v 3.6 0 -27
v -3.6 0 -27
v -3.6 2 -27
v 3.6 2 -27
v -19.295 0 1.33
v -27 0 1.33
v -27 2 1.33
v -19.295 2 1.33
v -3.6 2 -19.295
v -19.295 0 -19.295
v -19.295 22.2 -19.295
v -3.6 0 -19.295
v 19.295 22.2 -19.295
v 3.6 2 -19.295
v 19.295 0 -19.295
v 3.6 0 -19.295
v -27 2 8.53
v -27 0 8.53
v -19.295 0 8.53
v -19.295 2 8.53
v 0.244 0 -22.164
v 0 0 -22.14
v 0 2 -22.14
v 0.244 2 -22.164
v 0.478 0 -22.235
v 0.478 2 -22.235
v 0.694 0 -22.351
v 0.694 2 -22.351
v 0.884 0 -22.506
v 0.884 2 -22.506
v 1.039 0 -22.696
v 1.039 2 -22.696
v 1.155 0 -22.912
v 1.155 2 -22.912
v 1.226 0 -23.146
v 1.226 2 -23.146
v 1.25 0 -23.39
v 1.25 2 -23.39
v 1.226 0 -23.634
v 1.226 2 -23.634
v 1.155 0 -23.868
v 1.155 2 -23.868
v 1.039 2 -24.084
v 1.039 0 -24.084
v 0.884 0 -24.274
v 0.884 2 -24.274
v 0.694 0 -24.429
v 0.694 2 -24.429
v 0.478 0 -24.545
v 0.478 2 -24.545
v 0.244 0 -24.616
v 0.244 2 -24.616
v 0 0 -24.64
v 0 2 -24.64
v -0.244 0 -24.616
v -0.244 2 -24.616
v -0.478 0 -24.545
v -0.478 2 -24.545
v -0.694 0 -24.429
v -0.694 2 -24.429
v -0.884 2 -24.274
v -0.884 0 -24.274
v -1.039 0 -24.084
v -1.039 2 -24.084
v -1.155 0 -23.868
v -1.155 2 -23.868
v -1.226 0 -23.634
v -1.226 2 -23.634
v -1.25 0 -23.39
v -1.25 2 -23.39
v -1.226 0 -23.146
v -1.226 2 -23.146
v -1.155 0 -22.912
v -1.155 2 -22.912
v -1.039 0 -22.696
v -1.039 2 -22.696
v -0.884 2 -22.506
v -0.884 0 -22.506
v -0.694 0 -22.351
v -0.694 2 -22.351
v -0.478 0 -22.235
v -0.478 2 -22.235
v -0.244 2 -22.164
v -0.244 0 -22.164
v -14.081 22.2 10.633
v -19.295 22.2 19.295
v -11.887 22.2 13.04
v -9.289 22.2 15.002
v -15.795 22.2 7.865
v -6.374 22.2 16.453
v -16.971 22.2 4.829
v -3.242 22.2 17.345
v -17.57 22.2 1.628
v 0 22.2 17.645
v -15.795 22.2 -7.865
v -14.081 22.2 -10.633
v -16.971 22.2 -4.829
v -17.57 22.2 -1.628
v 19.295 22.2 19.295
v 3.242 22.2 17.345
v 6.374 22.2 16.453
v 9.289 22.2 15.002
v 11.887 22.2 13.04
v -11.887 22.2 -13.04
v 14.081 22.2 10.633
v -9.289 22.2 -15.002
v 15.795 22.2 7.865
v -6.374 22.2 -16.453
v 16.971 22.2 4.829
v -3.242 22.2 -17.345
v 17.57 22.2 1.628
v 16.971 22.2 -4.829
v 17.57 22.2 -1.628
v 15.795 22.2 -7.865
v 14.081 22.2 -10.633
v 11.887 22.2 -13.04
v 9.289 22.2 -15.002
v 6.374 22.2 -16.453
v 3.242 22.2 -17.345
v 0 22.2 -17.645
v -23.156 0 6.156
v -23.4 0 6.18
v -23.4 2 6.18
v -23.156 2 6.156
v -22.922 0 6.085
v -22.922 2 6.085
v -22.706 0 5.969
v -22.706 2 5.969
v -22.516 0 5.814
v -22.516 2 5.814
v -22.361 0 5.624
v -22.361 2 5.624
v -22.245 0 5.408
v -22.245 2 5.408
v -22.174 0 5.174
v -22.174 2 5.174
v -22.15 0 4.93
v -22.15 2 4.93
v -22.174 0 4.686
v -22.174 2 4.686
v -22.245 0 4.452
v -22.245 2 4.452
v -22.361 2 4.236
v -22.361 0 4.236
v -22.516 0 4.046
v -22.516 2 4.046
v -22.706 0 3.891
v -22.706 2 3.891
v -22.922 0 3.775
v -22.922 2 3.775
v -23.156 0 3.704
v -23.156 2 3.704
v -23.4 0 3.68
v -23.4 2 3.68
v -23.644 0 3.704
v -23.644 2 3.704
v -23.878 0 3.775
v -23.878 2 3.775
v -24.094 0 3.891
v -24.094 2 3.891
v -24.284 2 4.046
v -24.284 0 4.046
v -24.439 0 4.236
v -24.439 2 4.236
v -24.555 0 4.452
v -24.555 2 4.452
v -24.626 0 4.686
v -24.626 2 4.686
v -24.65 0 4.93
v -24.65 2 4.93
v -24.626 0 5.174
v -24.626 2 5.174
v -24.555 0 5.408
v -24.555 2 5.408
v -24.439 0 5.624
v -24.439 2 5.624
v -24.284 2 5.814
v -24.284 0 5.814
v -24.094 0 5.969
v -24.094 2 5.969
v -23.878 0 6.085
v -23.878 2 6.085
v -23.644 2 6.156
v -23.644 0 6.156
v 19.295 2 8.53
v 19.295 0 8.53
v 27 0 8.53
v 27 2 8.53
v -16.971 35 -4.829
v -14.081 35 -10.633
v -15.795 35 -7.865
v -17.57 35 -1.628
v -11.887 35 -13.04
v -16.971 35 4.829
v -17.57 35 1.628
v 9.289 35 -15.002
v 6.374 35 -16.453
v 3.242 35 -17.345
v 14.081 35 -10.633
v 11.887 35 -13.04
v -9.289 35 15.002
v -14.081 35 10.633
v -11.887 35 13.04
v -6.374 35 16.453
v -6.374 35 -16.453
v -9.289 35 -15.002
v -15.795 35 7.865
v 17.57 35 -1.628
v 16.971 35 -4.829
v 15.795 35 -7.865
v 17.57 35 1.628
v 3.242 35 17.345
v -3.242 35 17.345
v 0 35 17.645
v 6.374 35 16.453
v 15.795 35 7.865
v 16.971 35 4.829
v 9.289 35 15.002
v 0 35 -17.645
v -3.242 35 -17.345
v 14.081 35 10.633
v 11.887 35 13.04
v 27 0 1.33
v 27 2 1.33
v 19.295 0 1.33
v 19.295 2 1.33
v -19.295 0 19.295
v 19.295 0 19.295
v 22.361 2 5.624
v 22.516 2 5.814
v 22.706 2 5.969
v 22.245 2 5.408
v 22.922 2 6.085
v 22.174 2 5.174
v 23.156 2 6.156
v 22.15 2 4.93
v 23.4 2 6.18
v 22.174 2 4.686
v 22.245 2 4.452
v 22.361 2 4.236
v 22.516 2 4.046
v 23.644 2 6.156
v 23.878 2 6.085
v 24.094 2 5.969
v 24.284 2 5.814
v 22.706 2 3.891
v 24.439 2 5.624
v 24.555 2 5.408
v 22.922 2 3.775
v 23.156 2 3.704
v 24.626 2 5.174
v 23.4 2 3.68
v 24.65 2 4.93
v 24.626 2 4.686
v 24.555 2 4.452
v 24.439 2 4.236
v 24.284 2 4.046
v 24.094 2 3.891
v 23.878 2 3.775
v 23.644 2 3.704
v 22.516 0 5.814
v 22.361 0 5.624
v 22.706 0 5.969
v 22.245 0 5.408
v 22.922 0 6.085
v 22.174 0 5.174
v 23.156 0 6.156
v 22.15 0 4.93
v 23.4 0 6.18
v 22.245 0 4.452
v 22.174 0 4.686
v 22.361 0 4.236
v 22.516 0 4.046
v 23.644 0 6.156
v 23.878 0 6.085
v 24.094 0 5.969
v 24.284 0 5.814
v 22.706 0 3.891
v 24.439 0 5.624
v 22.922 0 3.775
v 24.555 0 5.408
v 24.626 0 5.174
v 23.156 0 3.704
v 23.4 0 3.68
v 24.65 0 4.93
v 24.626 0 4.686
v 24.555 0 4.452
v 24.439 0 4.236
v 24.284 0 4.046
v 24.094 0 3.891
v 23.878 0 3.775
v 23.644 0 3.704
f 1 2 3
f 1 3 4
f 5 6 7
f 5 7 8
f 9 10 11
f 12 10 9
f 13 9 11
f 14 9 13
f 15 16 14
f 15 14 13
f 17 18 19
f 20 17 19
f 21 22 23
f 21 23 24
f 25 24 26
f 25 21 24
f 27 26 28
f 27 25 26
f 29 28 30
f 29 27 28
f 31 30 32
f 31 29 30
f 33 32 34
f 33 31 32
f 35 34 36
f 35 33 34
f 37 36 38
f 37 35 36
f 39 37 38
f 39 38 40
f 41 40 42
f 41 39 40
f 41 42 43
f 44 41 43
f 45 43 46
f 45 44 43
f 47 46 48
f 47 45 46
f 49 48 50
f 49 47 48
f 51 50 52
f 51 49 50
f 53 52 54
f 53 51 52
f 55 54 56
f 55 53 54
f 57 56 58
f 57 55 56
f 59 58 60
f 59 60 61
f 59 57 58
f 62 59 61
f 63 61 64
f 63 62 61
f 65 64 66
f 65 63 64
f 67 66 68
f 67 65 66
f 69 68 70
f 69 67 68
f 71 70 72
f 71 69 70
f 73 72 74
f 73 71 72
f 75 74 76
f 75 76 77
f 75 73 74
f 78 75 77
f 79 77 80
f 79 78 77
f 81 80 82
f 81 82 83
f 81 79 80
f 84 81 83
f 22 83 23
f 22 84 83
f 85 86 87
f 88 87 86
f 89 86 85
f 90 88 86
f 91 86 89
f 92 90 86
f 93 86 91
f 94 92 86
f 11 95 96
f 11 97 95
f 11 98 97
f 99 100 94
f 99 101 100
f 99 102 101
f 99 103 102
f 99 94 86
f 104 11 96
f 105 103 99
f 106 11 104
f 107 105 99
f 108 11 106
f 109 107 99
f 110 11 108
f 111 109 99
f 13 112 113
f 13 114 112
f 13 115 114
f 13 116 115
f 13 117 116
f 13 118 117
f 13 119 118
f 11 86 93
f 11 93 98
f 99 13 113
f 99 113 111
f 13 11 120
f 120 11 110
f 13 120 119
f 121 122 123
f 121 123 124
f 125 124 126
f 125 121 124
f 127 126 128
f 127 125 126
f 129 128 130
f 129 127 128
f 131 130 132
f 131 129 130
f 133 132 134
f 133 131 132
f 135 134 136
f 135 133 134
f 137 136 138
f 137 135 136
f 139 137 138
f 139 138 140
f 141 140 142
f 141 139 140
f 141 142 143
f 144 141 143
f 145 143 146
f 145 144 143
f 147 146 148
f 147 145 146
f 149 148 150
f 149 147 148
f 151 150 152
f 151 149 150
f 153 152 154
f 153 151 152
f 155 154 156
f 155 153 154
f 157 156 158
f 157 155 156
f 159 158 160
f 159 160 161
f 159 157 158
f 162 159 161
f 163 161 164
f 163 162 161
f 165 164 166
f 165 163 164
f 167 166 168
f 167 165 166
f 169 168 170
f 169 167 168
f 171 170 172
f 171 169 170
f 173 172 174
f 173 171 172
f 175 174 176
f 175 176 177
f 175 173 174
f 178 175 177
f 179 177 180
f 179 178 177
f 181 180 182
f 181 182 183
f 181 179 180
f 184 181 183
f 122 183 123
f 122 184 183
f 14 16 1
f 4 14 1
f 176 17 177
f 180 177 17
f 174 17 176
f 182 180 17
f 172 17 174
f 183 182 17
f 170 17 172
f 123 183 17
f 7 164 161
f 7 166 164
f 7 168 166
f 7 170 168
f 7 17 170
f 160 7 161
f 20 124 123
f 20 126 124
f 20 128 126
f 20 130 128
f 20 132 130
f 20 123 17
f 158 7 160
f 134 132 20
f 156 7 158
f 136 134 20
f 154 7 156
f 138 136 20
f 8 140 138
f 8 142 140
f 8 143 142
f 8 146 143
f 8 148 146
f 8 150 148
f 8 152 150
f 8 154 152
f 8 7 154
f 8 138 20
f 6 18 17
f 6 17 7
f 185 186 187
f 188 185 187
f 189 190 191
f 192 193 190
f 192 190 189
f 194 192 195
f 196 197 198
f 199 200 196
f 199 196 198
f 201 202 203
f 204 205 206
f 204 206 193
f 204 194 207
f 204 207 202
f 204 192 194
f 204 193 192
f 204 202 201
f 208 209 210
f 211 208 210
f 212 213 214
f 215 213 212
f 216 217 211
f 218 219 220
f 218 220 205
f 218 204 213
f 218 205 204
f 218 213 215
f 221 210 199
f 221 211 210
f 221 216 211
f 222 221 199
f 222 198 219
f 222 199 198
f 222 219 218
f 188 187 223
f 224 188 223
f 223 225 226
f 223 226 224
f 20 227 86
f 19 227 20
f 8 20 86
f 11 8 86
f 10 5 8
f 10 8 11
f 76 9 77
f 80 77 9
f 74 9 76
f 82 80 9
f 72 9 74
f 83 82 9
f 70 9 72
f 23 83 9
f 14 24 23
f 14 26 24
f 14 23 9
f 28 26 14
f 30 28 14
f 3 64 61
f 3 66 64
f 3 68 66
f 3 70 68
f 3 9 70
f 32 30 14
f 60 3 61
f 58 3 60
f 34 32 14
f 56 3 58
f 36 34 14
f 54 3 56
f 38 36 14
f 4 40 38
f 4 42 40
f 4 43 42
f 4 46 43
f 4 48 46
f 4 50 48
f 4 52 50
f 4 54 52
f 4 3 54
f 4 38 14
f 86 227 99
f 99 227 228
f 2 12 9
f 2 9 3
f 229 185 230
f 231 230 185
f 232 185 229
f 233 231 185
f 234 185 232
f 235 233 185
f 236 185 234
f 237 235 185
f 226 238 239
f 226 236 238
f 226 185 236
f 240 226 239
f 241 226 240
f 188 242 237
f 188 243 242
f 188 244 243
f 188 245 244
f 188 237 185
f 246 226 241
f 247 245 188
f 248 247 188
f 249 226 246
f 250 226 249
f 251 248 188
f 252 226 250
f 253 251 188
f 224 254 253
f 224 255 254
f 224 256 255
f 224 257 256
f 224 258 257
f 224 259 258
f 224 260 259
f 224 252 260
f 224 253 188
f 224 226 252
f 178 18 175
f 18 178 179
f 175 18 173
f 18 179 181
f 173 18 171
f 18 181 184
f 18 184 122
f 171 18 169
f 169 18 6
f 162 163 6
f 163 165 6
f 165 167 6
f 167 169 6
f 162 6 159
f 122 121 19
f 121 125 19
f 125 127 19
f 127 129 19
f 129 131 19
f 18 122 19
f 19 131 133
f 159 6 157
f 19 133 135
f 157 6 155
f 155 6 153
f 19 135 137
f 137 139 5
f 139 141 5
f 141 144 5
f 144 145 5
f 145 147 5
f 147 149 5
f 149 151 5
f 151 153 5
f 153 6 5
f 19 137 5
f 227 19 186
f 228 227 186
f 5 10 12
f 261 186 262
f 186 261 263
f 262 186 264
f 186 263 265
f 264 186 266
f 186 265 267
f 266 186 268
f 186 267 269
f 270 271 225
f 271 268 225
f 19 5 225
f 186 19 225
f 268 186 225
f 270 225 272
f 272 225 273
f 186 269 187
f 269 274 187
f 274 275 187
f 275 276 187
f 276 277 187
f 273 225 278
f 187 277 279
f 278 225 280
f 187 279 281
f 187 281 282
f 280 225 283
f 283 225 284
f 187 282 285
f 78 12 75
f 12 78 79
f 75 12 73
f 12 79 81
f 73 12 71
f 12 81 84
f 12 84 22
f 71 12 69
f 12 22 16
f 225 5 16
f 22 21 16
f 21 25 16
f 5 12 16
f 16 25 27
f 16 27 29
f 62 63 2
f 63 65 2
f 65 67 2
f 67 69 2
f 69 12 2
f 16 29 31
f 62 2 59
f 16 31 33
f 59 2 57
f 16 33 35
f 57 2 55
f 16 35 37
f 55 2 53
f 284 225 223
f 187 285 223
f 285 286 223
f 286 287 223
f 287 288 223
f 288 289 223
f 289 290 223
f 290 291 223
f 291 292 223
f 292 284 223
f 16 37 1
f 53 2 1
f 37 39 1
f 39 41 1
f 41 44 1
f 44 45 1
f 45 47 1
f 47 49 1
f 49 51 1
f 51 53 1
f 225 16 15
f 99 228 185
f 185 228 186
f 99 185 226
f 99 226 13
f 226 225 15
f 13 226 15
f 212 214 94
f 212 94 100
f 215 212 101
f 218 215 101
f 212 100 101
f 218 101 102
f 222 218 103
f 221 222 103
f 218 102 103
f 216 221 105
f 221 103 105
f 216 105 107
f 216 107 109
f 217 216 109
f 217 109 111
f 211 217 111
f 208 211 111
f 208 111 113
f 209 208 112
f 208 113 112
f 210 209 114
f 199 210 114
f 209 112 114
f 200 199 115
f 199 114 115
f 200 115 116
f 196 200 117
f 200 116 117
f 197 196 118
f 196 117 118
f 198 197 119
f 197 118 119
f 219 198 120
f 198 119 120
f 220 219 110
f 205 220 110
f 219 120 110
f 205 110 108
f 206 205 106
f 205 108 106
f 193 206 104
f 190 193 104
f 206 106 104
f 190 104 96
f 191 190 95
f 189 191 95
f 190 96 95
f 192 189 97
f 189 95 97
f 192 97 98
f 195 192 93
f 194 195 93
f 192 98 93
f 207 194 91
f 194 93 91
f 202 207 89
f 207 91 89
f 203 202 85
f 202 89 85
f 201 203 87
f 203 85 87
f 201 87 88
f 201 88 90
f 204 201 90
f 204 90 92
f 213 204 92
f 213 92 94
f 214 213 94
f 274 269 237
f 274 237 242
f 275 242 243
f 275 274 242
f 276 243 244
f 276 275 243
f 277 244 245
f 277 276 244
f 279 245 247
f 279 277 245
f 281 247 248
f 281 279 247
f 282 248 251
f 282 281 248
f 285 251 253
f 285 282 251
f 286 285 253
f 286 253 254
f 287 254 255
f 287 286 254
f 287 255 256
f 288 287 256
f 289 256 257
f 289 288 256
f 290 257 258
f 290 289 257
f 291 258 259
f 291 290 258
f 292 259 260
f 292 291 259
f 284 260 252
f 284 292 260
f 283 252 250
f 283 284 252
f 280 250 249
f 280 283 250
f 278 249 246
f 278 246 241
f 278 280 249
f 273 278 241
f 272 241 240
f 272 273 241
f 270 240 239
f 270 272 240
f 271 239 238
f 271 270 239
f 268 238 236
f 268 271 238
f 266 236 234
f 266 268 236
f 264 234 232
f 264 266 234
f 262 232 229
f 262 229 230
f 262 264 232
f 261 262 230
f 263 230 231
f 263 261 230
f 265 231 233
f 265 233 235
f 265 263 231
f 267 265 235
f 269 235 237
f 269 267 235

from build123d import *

# Parameters (mm, degrees)
SK_HOUSING_W       = 38.59
SK_HOUSING_H       = 38.59
EX_HOUSING_DEPTH   = 22.2
SK_EARS_W          = 8
SK_EARS_H          = 7.2
SK_EARS_W_2        = 7.2
SK_EARS_H_2        = 8
EX_EARS_DEPTH      = 2
SK_HOLES_3X_R      = 1.25
CUT_HOLES_3X_DEPTH = 2
SK_DOME_R          = 17.645
EX_DOME_DEPTH      = 12.8


with BuildPart() as part:
    # SK_Housing → EX_Housing (new body)
    with BuildSketch(Plane(origin=(0, 0, 0), x_dir=(1, 0, 0), z_dir=(0, 1, 0))):
        Rectangle(SK_HOUSING_W, SK_HOUSING_H)
    extrude(amount=EX_HOUSING_DEPTH)

    # SK_Ears → EX_Ears (add)
    with BuildSketch(Plane(origin=(0, 0, 0), x_dir=(1, 0, 0), z_dir=(0, 1, 0))):
        with Locations((23, -4.93)):
            Rectangle(SK_EARS_W, SK_EARS_H)
        with Locations((-23, -4.93)):
            Rectangle(SK_EARS_W, SK_EARS_H)
        with Locations((0, 23)):
            Rectangle(SK_EARS_W_2, SK_EARS_H_2)
    extrude(amount=EX_EARS_DEPTH)

    # SK_Holes_3x → CUT_Holes_3x (cut)
    with BuildSketch(Plane(origin=(0, 0, 0), x_dir=(1, 0, 0), z_dir=(0, 1, 0))):
        with Locations((23.4, -4.93)):
            Circle(SK_HOLES_3X_R)
        with Locations((-23.4, -4.93)):
            Circle(SK_HOLES_3X_R)
        with Locations((0, 23.39)):
            Circle(SK_HOLES_3X_R)
    extrude(amount=CUT_HOLES_3X_DEPTH, mode=Mode.SUBTRACT)

    # SK_Dome → EX_Dome (add)
    with BuildSketch(Plane(origin=(0, 22.2, 0), x_dir=(1, 0, 0), z_dir=(0, 1, 0))):
        Circle(SK_DOME_R)
    extrude(amount=EX_DOME_DEPTH)


solid = part.part
